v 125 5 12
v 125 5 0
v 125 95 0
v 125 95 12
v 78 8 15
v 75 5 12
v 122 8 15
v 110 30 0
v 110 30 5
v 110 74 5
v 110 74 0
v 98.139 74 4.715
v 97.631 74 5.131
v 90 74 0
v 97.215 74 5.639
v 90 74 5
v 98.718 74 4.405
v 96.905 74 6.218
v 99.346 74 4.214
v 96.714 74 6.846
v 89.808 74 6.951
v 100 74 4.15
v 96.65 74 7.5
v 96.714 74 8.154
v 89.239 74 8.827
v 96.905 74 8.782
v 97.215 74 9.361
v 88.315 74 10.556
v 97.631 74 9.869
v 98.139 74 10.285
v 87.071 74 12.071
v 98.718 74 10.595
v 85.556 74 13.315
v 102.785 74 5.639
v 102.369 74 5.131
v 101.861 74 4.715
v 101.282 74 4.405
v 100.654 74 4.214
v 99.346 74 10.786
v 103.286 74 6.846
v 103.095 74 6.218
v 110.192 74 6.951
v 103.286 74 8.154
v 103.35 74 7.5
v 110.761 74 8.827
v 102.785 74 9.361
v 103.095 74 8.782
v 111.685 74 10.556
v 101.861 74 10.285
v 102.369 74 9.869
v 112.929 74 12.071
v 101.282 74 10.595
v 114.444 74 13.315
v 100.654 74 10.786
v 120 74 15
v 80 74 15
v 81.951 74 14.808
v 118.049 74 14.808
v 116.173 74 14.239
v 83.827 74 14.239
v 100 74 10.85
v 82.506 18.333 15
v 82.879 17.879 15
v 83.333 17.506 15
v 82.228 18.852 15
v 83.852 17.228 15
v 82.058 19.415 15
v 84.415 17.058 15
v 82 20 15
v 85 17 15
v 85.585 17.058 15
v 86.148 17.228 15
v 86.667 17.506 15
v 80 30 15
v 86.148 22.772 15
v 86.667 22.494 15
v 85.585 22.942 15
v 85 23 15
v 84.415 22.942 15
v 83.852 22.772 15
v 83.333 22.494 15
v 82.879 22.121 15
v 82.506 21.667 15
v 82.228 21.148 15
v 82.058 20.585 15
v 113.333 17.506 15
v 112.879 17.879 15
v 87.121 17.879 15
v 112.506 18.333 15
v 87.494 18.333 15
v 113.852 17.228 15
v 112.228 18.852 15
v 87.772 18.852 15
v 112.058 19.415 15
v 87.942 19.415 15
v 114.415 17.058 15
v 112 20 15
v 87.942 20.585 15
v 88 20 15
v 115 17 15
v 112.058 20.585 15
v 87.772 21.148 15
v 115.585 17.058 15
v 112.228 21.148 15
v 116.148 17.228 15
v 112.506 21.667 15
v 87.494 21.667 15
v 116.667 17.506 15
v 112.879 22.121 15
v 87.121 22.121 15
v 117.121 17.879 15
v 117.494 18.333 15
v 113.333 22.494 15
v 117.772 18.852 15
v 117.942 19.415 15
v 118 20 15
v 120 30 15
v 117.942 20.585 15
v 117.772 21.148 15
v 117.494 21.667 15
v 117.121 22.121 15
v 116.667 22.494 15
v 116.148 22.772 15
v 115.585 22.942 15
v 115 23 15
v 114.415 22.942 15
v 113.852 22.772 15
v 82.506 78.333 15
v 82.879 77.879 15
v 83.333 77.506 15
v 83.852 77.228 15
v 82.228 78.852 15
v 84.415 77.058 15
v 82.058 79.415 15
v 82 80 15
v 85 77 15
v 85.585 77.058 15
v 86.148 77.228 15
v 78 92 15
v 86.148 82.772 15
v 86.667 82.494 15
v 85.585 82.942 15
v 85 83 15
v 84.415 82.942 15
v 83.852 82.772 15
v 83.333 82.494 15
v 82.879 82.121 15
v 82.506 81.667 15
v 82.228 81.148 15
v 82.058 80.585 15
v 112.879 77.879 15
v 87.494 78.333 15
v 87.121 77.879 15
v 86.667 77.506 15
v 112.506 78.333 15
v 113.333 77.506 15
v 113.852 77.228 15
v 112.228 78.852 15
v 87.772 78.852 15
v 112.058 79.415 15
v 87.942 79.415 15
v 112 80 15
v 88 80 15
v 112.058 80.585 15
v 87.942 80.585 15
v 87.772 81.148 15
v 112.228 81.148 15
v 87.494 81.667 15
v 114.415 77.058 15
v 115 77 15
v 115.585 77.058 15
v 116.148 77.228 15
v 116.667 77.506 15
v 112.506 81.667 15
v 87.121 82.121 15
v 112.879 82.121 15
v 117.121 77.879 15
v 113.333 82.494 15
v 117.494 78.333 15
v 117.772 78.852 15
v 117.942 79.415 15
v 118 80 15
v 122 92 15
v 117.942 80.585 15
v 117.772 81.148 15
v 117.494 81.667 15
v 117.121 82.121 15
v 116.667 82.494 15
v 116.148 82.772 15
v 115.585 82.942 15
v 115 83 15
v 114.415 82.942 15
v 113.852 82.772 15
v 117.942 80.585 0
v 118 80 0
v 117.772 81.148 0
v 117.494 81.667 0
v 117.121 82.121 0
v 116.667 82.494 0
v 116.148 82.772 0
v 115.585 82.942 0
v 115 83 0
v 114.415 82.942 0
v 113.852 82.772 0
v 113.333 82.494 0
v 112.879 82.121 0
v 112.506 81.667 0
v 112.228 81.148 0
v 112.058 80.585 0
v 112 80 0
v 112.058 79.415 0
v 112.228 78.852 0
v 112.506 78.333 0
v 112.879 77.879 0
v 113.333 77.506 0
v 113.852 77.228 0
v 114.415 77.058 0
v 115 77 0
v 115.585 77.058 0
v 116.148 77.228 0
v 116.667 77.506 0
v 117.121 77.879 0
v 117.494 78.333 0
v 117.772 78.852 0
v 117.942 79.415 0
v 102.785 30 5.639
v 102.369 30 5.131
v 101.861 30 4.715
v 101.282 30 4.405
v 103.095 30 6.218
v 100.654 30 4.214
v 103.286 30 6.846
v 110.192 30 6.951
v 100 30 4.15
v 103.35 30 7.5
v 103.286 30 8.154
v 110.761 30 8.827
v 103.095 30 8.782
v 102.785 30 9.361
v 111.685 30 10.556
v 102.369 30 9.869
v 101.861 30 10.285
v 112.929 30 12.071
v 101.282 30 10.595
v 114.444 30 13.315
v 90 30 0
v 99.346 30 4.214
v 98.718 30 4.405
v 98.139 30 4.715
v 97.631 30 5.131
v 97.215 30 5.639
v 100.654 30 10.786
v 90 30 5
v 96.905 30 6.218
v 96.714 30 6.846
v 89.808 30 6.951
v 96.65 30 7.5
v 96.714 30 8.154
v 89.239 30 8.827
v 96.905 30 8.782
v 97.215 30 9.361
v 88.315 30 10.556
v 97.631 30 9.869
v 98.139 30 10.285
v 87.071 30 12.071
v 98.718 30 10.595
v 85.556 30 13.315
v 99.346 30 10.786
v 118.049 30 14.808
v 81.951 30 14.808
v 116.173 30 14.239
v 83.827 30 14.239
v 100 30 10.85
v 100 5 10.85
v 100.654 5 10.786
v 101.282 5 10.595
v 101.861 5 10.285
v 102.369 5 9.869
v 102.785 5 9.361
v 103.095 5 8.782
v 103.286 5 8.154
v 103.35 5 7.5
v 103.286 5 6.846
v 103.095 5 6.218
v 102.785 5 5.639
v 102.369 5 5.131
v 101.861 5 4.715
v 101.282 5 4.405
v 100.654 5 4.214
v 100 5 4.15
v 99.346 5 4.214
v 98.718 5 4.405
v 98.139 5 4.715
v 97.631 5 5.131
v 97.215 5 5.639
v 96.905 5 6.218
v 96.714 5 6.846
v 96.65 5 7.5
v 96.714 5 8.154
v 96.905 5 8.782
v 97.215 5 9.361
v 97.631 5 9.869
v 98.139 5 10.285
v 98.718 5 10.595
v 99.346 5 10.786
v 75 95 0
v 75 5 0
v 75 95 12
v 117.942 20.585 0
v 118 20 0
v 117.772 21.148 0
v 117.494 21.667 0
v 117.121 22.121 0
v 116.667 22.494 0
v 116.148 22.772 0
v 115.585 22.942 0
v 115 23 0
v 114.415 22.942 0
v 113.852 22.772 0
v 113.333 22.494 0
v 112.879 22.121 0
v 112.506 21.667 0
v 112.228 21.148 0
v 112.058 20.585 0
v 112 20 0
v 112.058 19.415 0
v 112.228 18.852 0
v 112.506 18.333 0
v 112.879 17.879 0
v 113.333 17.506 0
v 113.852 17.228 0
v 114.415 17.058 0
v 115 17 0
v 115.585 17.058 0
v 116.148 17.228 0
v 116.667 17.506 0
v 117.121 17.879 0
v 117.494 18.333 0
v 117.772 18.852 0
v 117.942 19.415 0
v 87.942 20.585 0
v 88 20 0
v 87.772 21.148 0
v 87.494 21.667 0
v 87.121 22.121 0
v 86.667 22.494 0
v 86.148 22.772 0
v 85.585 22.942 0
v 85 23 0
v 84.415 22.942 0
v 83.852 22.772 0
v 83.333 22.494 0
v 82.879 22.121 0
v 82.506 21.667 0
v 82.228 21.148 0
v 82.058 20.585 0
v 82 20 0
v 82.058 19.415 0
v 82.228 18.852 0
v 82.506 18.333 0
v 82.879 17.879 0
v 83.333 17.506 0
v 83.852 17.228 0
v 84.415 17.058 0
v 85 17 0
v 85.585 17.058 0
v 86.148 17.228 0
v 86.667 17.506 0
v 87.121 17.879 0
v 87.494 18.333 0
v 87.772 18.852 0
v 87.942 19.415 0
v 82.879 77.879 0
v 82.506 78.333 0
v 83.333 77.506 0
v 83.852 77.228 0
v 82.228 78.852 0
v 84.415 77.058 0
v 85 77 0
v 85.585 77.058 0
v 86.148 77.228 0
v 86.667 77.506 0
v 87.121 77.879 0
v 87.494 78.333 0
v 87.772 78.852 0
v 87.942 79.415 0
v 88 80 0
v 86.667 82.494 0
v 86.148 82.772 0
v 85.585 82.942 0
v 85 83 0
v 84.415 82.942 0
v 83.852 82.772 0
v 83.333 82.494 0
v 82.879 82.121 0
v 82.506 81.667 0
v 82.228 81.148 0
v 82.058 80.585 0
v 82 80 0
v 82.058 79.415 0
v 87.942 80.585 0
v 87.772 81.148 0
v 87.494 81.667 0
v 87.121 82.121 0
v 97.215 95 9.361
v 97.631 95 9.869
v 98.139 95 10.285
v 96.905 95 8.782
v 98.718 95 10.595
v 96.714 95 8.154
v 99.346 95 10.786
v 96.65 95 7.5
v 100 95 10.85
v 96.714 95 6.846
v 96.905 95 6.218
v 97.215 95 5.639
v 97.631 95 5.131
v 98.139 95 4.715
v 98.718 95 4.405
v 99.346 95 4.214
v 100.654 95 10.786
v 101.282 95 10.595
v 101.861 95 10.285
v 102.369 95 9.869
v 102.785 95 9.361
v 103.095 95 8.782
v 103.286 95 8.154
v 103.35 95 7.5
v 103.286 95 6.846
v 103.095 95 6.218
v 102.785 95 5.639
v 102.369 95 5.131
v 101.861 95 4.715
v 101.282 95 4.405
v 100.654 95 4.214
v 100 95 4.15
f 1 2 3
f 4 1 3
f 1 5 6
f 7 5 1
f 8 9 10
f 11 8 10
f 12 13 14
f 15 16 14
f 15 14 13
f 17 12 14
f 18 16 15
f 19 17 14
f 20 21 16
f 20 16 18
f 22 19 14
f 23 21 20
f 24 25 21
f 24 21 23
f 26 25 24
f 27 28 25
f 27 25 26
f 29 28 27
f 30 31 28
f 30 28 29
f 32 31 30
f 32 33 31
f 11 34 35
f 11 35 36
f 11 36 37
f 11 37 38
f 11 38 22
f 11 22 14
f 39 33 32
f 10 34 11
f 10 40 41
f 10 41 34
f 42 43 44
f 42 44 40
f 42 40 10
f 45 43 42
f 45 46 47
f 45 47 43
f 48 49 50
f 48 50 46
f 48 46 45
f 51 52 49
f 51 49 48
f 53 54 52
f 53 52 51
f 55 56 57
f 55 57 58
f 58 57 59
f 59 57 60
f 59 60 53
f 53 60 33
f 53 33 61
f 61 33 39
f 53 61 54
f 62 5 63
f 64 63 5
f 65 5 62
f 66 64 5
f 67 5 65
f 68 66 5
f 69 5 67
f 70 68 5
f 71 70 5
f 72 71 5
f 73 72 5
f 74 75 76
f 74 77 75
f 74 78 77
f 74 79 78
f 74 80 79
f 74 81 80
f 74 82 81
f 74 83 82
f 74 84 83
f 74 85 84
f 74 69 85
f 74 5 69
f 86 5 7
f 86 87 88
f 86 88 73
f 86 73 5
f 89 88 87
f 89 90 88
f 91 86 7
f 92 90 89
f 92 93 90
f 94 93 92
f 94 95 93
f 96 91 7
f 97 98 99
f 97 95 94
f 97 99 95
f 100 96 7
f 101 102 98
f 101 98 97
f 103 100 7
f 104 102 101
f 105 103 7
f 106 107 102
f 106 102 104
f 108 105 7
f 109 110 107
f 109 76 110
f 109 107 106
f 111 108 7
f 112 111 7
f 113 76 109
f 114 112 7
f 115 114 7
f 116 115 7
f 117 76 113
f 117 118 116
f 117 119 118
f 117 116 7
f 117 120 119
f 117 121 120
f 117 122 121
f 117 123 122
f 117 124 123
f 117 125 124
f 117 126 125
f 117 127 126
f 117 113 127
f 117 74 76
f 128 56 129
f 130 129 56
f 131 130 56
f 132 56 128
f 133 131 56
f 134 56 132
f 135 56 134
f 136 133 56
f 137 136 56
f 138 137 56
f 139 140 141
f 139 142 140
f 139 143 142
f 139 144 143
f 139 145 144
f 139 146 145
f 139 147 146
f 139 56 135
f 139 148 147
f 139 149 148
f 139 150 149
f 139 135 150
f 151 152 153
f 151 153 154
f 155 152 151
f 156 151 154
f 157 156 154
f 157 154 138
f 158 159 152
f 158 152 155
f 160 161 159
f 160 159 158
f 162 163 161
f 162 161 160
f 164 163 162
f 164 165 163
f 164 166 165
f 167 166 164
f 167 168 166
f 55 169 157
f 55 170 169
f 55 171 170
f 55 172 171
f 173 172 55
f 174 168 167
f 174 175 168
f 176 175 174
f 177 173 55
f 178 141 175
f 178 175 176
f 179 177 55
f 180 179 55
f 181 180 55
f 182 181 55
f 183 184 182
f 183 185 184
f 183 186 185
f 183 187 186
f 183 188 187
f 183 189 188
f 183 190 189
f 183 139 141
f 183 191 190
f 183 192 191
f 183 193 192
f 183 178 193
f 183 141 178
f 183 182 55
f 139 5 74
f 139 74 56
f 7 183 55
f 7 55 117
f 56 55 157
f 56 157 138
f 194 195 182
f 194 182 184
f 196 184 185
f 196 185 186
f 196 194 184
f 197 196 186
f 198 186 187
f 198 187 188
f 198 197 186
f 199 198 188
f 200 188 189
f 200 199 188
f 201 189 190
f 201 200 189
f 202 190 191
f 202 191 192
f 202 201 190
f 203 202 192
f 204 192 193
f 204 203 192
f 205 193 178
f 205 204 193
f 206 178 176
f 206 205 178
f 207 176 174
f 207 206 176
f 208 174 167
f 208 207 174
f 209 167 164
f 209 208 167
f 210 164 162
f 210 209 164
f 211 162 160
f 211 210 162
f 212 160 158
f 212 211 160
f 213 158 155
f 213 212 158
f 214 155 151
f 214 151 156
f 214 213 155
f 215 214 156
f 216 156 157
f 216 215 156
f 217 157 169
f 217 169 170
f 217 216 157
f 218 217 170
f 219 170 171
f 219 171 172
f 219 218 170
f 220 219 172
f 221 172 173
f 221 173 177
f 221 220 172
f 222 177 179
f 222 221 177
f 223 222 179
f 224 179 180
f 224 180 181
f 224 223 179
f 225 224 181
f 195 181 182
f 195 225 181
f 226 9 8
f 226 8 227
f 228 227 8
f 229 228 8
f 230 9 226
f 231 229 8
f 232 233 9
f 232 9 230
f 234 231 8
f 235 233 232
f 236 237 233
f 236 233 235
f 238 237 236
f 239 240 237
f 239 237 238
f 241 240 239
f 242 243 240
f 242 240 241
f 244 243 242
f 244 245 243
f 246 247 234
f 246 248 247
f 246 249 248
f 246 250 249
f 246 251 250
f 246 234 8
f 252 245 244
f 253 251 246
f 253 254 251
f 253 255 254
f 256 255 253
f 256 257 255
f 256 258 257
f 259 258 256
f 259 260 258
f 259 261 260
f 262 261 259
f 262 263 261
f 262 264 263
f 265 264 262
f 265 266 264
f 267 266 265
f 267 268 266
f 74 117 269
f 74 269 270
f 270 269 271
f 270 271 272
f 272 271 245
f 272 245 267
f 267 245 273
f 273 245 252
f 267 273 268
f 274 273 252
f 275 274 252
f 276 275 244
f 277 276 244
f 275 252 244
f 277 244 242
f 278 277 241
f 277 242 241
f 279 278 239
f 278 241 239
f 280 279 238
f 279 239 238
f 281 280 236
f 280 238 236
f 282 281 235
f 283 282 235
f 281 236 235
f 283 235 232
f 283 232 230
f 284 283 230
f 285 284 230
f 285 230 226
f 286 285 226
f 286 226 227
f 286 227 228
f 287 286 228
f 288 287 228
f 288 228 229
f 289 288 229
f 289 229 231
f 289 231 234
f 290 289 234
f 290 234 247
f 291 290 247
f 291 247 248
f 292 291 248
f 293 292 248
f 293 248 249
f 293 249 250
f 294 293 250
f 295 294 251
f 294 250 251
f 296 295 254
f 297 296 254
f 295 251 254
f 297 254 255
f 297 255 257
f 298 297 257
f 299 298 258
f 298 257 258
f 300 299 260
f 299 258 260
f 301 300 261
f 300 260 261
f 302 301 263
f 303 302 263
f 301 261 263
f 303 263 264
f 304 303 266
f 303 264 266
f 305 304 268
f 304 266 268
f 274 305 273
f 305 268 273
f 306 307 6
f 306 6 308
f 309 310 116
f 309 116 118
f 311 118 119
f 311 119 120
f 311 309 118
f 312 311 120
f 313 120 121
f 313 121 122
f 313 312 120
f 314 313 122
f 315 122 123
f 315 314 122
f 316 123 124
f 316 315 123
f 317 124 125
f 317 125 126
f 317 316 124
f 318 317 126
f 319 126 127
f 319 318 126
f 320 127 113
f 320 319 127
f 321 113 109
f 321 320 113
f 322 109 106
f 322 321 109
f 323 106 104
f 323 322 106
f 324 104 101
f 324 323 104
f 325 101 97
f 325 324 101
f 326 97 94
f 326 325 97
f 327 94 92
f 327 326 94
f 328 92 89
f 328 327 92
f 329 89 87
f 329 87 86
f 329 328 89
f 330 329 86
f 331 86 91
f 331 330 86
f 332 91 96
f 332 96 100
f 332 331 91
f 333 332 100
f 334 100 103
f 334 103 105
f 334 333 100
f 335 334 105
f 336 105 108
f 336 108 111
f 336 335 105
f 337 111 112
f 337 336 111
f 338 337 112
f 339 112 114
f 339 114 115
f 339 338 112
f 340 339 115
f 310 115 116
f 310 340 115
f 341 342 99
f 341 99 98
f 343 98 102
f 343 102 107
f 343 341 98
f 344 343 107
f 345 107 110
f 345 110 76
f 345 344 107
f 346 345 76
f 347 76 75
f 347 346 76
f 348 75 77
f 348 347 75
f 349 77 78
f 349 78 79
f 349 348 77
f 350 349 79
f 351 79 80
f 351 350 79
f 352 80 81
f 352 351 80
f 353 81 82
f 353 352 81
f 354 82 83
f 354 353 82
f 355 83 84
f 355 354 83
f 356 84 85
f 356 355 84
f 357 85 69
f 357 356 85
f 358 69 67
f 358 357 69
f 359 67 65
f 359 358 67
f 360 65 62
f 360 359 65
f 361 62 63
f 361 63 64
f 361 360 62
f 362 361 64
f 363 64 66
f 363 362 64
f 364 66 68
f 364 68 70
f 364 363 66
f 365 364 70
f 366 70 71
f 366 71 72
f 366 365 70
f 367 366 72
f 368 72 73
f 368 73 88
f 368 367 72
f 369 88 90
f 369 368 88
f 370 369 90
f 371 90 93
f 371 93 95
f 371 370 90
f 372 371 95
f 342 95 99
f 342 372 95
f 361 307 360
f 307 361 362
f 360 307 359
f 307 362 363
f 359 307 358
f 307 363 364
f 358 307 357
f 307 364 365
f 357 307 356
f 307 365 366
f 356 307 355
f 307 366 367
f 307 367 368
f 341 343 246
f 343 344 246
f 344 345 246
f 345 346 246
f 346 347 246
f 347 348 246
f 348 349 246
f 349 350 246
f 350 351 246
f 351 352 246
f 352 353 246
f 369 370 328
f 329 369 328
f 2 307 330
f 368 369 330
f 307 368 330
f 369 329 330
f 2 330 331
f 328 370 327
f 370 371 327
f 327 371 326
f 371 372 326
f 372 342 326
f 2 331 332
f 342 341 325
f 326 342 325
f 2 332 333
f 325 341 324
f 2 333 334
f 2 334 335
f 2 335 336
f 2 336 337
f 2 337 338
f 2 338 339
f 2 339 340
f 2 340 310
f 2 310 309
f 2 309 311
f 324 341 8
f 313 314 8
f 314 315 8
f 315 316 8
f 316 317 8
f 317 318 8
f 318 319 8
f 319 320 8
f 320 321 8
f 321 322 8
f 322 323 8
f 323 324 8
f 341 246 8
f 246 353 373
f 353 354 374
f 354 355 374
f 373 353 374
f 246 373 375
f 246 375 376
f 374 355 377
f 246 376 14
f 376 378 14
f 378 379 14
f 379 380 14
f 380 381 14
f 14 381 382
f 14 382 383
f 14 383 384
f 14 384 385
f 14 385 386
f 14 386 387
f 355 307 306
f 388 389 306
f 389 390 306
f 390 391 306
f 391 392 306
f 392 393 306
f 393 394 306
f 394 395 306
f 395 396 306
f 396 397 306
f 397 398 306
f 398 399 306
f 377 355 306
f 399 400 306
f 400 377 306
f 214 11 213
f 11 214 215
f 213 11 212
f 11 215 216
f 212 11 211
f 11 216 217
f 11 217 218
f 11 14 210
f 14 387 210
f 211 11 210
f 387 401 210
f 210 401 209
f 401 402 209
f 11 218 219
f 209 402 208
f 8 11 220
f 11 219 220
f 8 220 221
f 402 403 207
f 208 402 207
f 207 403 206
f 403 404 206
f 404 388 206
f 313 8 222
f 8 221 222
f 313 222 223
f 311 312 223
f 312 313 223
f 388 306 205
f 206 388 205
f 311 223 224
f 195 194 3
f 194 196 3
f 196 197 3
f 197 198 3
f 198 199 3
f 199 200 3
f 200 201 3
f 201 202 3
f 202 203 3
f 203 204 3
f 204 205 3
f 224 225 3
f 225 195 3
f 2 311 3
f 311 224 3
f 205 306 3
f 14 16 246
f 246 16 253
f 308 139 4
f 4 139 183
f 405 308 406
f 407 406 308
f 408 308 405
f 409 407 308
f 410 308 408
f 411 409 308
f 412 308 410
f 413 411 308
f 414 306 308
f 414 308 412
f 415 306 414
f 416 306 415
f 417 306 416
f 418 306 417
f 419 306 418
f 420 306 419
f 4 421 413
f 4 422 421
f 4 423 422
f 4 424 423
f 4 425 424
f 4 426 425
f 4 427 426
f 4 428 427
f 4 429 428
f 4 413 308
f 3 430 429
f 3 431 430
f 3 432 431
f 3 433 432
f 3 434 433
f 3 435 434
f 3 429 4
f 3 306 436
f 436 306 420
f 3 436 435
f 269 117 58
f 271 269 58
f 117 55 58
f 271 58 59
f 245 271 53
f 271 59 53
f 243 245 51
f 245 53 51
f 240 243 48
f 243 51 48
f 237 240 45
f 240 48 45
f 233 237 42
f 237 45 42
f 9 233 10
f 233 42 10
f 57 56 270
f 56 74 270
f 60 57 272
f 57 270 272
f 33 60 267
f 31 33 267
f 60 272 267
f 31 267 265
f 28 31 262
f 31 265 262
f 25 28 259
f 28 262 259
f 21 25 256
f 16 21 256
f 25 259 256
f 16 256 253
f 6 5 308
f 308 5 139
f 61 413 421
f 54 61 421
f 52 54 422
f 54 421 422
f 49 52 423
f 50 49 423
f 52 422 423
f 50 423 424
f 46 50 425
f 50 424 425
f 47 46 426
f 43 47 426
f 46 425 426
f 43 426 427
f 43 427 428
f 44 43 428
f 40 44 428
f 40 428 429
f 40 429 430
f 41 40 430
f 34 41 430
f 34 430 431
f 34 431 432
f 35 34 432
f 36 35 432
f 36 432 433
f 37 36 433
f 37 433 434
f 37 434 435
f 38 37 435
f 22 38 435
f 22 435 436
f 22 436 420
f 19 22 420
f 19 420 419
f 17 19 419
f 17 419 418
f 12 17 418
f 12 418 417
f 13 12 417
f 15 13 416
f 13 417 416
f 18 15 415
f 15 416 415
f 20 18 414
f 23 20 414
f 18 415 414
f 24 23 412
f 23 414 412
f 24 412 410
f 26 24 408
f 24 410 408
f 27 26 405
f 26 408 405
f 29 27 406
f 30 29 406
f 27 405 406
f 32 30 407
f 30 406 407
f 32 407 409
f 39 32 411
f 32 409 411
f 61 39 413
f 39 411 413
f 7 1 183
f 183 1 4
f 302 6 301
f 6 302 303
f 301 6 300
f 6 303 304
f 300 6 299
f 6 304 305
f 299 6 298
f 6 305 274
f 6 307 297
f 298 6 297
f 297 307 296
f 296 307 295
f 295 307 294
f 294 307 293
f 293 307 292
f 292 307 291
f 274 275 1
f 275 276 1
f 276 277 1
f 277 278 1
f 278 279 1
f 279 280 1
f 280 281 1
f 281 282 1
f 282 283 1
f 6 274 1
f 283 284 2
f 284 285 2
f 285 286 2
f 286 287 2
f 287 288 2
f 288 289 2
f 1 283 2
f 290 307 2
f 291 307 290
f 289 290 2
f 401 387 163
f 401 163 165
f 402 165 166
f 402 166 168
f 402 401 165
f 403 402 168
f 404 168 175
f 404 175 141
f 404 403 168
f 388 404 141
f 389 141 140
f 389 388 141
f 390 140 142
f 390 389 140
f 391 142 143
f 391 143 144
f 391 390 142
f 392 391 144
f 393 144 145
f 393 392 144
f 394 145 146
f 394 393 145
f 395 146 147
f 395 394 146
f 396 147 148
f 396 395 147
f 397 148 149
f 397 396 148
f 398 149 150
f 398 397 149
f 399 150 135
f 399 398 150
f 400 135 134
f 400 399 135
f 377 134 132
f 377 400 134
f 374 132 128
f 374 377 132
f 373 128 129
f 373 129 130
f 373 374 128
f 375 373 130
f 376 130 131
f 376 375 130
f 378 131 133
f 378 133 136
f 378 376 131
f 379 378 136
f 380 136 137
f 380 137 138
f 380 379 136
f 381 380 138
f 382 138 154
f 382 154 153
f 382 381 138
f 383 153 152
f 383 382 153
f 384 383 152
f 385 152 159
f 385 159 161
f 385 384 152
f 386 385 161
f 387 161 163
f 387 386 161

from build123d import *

# Parameters (mm, degrees)
SKETCH1_W           = 50
SKETCH1_H           = 90
SKETCH1_R           = 3
BOSS_EXTRUDE1_DEPTH = 15
SKETCH2_R           = 3.35
CUT_EXTRUDE1_DEPTH  = 155.757875405
CUT_EXTRUDE2_DEPTH  = 158.718102956
CHAMFER1_SIZE       = 3
FILLET1_R           = 10


with BuildPart() as part:
    # Sketch1 → Boss-Extrude1 (new body)
    with BuildSketch(Plane.XY):
        with Locations((100, 50)):
            Rectangle(SKETCH1_W, SKETCH1_H)
        with Locations((115, 20)):
            Circle(SKETCH1_R, mode=Mode.SUBTRACT)
        with Locations((85, 20)):
            Circle(SKETCH1_R, mode=Mode.SUBTRACT)
        with Locations((115, 80)):
            Circle(SKETCH1_R, mode=Mode.SUBTRACT)
        with Locations((85, 80)):
            Circle(SKETCH1_R, mode=Mode.SUBTRACT)
    extrude(amount=BOSS_EXTRUDE1_DEPTH)

    # Sketch2 → Cut-Extrude1 (cut, through all)
    with BuildSketch(Plane(origin=(0, 95, 0), x_dir=(1, 0, 0), z_dir=(0, 1, 0))):
        with Locations(Location((100, -7.5, 0), (0, 0, 270))):
            Circle(SKETCH2_R)
    extrude(amount=-CUT_EXTRUDE1_DEPTH, mode=Mode.SUBTRACT)

    # Sketch3 → Cut-Extrude2 (cut, through all)
    with BuildSketch(Plane.XY.offset(15)):
        Polygon((90, 70), (90, 74), (110, 74), (110, 70), (110, 30), (90, 30), align=None)
    extrude(amount=-CUT_EXTRUDE2_DEPTH, mode=Mode.SUBTRACT)

    # Chamfer1
    chamfer1_edges = [part.edges().sort_by_distance(p)[0] for p in [
        (75, 50, 15),
        (100, 5, 15),
        (125, 50, 15),
        (100, 95, 15),
    ]]
    chamfer(chamfer1_edges, length=CHAMFER1_SIZE)

    # Fillet1
    fillet1_edges = [part.edges().sort_by_distance(p)[0] for p in [
        (90, 52, 15),
        (110, 52, 15),
    ]]
    fillet(fillet1_edges, radius=FILLET1_R)


solid = part.part
